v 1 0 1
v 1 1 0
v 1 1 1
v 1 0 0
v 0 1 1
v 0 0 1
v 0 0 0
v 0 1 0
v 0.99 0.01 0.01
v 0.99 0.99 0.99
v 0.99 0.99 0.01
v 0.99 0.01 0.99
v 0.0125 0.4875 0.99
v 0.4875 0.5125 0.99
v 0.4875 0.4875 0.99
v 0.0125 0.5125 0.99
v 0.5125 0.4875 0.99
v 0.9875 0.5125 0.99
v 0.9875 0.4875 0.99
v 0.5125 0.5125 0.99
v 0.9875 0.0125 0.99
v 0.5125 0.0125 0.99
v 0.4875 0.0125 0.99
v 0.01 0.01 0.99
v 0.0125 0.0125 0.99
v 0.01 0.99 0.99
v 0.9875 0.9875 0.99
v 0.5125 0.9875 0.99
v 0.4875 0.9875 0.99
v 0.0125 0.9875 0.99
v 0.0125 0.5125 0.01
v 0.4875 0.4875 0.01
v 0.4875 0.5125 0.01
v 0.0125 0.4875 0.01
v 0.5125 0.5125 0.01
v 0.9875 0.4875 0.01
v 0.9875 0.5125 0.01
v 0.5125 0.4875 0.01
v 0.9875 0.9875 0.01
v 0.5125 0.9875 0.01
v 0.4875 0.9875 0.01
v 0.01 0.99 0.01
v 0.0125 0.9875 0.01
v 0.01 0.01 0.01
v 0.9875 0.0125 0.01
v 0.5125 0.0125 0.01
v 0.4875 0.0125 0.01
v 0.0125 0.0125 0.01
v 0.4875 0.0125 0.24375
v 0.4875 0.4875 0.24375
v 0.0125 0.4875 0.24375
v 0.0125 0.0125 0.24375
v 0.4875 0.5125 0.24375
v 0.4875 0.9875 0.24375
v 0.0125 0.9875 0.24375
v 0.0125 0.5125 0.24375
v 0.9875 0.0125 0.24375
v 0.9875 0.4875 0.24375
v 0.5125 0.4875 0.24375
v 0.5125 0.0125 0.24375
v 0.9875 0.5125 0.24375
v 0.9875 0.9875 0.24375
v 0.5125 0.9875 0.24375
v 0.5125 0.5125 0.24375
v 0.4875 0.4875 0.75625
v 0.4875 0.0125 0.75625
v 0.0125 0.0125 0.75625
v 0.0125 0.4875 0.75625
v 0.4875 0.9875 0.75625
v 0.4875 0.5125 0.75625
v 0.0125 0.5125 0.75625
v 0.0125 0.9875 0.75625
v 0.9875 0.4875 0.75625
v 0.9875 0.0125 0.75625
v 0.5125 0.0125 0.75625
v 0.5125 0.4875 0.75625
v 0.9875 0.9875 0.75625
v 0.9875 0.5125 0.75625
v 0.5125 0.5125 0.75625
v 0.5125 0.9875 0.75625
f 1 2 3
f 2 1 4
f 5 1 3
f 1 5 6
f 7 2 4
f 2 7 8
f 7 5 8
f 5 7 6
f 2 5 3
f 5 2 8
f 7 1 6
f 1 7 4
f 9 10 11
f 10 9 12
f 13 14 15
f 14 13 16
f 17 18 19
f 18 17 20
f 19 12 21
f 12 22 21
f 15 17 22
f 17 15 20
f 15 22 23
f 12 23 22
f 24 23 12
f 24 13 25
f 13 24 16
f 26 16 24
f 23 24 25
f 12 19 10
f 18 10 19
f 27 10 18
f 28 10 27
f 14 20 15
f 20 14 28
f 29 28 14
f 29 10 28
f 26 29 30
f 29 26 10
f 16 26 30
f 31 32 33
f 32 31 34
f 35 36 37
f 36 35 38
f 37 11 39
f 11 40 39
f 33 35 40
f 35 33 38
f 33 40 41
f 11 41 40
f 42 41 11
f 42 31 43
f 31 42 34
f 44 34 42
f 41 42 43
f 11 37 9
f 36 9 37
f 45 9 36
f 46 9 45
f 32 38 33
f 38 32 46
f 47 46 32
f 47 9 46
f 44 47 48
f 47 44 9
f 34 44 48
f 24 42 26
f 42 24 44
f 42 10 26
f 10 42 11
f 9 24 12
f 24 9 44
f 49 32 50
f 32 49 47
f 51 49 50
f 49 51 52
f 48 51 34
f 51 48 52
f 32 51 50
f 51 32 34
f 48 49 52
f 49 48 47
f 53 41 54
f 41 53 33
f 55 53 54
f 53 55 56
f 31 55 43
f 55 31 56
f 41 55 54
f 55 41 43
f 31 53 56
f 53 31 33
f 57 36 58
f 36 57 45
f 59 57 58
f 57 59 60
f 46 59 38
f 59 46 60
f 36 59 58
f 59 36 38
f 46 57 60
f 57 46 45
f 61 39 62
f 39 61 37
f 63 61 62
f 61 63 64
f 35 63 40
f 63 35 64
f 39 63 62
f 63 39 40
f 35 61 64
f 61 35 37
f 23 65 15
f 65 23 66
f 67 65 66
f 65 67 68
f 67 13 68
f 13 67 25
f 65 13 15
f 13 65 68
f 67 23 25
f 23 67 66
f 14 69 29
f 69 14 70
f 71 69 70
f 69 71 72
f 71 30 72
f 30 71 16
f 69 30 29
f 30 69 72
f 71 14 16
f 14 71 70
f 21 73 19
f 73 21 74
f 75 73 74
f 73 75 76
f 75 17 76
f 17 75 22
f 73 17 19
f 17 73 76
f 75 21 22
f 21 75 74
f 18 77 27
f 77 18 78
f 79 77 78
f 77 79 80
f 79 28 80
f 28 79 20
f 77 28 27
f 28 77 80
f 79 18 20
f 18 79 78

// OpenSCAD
translate([0.25, 0.25, 0.125]) color([0.36604355066630223, 0.49574653220142006, 0.2571489256046471]) cube([0.475, 0.475, 0.2375], center=true);
translate([0.25, 0.75, 0.125]) color([0.8374632643388946, 0.9805052880896761, 0.7293080884755028]) cube([0.475, 0.475, 0.2375], center=true);
translate([0.75, 0.25, 0.125]) color([0.7102462781470706, 0.33116367429719706, 0.8694016796882821]) cube([0.475, 0.475, 0.2375], center=true);
translate([0.75, 0.75, 0.125]) color([0.15926942089300955, 0.6020328264740608, 0.3939291367673188]) cube([0.475, 0.475, 0.2375], center=true);
translate([0.25, 0.25, 0.875]) color([0.17107948370632353, 0.5511468417605202, 0.6362547263976265]) cube([0.475, 0.475, 0.2375], center=true);
translate([0.25, 0.75, 0.875]) color([0.4513488113702364, 0.4273913195858777, 0.7941595965619336]) cube([0.475, 0.475, 0.2375], center=true);
translate([0.75, 0.25, 0.875]) color([0.250259319804494, 0.668466334841109, 0.9558425975622227]) cube([0.475, 0.475, 0.2375], center=true);
translate([0.75, 0.75, 0.875]) color([0.8787840809996866, 0.7297949922477387, 0.6760701789099856]) cube([0.475, 0.475, 0.2375], center=true);
color([0.3,0.3,0.3,0.3]) difference() { cube([1,1,1]); translate([0.01,0.01,0.01]) cube([0.98,0.98,0.98]); }
